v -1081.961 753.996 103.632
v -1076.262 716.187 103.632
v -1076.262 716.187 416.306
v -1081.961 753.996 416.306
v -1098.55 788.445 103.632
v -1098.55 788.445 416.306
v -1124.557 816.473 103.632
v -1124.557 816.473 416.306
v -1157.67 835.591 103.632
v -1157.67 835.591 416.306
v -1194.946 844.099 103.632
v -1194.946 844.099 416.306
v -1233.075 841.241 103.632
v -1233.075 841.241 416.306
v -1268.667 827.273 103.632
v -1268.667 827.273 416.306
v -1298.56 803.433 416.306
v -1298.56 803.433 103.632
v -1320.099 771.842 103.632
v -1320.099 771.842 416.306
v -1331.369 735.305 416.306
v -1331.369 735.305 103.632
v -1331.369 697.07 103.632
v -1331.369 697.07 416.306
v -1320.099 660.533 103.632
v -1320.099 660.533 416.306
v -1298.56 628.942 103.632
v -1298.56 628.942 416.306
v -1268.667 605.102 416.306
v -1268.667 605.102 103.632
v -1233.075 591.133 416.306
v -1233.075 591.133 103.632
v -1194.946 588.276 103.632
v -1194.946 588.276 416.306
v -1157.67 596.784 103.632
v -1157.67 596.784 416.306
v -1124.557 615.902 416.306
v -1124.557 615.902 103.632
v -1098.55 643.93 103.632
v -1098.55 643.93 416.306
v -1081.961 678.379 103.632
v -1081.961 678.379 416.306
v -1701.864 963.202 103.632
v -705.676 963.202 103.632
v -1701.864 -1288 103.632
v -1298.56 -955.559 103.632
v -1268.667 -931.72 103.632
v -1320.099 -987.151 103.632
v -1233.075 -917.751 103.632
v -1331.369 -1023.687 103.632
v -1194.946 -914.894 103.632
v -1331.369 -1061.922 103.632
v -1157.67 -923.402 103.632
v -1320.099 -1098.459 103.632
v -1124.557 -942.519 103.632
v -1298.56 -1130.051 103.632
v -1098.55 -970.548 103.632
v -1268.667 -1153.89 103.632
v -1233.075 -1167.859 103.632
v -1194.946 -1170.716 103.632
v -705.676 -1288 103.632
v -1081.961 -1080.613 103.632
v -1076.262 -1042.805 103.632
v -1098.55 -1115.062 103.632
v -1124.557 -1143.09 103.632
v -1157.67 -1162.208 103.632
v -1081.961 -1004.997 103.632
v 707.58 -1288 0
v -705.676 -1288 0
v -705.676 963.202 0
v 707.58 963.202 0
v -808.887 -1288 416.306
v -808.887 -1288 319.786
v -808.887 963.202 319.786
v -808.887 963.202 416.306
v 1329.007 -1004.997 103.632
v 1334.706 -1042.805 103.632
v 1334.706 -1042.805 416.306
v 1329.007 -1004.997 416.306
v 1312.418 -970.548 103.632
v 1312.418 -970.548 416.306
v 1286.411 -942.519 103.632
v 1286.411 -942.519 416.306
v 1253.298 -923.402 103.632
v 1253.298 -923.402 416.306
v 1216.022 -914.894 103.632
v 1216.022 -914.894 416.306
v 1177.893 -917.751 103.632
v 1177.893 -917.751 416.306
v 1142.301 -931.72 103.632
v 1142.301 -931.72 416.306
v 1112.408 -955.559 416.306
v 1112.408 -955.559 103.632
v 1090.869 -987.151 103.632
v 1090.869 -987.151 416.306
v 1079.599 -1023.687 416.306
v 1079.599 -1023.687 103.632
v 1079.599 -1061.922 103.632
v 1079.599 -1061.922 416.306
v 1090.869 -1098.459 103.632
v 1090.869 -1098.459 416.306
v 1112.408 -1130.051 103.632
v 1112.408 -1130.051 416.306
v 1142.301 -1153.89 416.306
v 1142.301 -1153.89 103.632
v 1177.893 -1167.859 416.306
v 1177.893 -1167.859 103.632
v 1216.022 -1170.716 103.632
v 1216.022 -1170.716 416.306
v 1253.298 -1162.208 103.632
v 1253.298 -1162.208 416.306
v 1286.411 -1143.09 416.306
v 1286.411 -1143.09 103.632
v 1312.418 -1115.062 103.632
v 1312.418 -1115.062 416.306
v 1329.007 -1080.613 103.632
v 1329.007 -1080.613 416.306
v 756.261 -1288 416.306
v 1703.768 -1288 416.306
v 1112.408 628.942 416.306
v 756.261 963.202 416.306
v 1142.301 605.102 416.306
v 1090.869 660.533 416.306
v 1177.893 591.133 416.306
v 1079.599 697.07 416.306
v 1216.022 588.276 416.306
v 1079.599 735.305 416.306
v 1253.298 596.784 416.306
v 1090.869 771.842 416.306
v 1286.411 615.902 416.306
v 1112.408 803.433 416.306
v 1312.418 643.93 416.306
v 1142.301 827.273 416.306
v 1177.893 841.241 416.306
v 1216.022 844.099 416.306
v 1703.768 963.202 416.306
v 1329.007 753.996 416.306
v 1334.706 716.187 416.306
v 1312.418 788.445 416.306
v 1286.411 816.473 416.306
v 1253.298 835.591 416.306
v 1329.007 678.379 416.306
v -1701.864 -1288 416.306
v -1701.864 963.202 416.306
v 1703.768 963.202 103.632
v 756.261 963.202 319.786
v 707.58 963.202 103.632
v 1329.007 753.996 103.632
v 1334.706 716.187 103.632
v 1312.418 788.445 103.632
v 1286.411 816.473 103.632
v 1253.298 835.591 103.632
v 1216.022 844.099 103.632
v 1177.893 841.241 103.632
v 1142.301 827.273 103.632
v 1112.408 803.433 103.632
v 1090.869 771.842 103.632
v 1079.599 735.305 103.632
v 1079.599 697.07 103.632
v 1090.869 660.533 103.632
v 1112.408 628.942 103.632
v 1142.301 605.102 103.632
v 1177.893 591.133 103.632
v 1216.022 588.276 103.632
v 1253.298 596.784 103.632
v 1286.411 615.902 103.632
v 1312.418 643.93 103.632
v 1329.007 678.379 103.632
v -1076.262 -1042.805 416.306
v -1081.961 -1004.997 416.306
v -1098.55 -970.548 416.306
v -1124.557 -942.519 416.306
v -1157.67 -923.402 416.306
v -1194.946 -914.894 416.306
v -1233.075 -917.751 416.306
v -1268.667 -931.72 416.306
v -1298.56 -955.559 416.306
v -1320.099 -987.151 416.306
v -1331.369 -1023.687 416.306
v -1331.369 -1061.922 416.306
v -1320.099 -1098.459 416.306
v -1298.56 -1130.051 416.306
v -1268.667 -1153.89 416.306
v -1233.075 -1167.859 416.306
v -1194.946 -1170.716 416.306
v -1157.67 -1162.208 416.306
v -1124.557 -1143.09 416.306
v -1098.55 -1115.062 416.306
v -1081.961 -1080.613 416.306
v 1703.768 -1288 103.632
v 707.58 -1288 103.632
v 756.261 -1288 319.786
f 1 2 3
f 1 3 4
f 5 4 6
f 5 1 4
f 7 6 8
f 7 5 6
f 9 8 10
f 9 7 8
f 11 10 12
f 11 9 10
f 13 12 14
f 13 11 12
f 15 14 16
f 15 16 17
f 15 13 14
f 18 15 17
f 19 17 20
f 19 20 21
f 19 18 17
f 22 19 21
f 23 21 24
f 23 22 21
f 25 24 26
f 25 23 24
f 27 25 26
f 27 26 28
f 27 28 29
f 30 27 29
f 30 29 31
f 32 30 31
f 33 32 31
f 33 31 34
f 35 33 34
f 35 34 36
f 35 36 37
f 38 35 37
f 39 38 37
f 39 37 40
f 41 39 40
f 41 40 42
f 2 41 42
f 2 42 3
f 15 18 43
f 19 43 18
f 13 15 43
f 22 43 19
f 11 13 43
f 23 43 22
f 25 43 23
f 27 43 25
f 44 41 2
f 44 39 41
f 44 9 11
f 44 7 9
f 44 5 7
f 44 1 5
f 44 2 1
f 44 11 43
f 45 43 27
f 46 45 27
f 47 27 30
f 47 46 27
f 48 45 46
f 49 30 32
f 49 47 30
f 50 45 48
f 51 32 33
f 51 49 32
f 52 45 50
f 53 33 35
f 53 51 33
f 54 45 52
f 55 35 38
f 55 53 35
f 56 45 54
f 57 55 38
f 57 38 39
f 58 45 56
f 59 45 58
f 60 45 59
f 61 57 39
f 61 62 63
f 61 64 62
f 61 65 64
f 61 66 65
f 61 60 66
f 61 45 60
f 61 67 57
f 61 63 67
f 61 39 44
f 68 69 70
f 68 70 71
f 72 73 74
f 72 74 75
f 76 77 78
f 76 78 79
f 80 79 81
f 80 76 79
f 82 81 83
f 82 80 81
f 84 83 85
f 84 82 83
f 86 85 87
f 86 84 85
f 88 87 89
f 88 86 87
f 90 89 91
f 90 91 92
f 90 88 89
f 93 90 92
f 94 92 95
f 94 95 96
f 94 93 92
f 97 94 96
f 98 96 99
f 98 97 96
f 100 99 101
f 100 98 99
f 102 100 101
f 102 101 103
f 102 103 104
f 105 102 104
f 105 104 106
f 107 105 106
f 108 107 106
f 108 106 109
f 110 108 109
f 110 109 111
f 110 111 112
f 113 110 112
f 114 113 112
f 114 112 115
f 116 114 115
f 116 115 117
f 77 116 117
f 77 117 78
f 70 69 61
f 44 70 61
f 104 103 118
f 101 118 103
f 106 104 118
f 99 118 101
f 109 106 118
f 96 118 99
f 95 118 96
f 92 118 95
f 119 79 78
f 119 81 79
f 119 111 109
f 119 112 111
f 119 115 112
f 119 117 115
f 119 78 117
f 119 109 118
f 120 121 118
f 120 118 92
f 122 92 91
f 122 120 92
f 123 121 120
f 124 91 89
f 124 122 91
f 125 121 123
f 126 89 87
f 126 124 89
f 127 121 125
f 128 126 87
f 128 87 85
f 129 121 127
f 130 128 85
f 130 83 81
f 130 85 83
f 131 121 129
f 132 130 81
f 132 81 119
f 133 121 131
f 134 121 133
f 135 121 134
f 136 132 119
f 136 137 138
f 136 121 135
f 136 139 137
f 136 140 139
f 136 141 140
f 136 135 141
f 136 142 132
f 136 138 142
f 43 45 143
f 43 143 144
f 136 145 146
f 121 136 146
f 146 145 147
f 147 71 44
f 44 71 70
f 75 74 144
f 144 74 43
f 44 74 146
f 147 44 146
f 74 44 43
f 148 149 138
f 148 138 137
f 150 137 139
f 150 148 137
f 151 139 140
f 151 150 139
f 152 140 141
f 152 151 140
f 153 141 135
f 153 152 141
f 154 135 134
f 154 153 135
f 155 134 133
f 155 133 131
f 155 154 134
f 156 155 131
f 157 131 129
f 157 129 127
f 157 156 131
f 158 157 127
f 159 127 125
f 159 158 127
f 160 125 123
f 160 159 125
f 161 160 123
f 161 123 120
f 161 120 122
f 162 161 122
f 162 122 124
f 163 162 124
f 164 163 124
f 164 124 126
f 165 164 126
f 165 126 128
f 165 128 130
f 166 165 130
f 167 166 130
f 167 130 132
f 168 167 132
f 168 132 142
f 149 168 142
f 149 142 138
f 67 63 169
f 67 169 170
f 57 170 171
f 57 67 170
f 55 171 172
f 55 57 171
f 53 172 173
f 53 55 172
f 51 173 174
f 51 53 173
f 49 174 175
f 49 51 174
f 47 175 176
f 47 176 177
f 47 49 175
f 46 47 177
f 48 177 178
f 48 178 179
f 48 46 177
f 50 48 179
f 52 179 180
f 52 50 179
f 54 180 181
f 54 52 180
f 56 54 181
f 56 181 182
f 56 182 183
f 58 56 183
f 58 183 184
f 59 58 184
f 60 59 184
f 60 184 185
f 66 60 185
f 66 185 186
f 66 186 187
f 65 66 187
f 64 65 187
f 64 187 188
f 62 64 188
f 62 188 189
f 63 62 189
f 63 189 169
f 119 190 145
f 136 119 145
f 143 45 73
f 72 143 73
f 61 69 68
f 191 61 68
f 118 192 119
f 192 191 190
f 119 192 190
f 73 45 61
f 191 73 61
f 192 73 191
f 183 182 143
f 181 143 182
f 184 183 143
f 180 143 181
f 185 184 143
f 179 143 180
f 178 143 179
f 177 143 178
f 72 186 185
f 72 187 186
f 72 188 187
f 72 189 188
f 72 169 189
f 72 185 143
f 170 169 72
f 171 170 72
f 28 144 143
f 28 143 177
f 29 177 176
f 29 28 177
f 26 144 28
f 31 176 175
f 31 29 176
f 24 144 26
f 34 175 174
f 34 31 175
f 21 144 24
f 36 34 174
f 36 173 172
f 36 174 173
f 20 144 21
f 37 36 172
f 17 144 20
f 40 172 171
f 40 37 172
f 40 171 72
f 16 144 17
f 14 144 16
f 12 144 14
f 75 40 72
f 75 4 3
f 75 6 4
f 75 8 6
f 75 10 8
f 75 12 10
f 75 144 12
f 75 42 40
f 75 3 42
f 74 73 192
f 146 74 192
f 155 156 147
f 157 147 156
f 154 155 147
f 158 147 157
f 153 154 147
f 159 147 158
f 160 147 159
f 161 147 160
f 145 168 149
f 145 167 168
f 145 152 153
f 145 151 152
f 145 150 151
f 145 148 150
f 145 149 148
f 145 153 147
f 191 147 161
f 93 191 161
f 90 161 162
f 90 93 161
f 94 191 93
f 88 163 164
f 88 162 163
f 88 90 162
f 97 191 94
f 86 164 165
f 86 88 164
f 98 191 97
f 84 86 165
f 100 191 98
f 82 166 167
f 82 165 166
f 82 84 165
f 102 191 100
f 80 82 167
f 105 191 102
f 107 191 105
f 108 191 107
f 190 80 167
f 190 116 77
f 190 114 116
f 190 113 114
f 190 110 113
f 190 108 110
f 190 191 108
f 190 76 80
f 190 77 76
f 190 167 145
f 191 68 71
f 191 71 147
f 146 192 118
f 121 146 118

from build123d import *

# Parameters (mm, degrees)
F0_W     = 994.664
F0_H     = 2251.202
F0_R     = 128.27
F0_W_2   = 1416.304
F1_DEPTH = 416.306
F2_W     = 1565.148
F2_H     = 96.52
F2_W_2   = 996.188
F2_H_2   = 103.632
F3_DEPTH = 2540


with BuildPart() as f1:
    # F0 (on Top) → F1 (new body)
    with BuildSketch(Plane.XY):
        with Locations((-1204.531931, -162.398902)):
            Rectangle(F0_W, F0_H)
        with Locations((-1204.531931, -1042.804837)):
            Circle(F0_R, mode=Mode.SUBTRACT)
        with Locations((-1204.531931, 716.187477)):
            Circle(F0_R, mode=Mode.SUBTRACT)
        with Locations((0.952069, -162.398902)):
            Rectangle(F0_W_2, F0_H)
        with Locations((1206.436069, -162.398902)):
            Rectangle(F0_W, F0_H)
        with Locations((1206.436069, -1042.804837)):
            Circle(F0_R, mode=Mode.SUBTRACT)
        with Locations((1206.436069, 716.187477)):
            Circle(F0_R, mode=Mode.SUBTRACT)
    extrude(amount=F1_DEPTH)

    # F2 (on face) → F3 (cut)
    with BuildSketch(Plane.XZ.offset(1287.999902)):
        with Locations((-26.313184, 368.046)):
            Rectangle(F2_W, F2_H)
        with Locations((-1203.769931, 51.816)):
            Rectangle(F2_W_2, F2_H_2)
        with Locations((1205.674069, 51.816)):
            Rectangle(F2_W_2, F2_H_2)
    extrude(amount=-F3_DEPTH, mode=Mode.SUBTRACT)


solid = f1.part
